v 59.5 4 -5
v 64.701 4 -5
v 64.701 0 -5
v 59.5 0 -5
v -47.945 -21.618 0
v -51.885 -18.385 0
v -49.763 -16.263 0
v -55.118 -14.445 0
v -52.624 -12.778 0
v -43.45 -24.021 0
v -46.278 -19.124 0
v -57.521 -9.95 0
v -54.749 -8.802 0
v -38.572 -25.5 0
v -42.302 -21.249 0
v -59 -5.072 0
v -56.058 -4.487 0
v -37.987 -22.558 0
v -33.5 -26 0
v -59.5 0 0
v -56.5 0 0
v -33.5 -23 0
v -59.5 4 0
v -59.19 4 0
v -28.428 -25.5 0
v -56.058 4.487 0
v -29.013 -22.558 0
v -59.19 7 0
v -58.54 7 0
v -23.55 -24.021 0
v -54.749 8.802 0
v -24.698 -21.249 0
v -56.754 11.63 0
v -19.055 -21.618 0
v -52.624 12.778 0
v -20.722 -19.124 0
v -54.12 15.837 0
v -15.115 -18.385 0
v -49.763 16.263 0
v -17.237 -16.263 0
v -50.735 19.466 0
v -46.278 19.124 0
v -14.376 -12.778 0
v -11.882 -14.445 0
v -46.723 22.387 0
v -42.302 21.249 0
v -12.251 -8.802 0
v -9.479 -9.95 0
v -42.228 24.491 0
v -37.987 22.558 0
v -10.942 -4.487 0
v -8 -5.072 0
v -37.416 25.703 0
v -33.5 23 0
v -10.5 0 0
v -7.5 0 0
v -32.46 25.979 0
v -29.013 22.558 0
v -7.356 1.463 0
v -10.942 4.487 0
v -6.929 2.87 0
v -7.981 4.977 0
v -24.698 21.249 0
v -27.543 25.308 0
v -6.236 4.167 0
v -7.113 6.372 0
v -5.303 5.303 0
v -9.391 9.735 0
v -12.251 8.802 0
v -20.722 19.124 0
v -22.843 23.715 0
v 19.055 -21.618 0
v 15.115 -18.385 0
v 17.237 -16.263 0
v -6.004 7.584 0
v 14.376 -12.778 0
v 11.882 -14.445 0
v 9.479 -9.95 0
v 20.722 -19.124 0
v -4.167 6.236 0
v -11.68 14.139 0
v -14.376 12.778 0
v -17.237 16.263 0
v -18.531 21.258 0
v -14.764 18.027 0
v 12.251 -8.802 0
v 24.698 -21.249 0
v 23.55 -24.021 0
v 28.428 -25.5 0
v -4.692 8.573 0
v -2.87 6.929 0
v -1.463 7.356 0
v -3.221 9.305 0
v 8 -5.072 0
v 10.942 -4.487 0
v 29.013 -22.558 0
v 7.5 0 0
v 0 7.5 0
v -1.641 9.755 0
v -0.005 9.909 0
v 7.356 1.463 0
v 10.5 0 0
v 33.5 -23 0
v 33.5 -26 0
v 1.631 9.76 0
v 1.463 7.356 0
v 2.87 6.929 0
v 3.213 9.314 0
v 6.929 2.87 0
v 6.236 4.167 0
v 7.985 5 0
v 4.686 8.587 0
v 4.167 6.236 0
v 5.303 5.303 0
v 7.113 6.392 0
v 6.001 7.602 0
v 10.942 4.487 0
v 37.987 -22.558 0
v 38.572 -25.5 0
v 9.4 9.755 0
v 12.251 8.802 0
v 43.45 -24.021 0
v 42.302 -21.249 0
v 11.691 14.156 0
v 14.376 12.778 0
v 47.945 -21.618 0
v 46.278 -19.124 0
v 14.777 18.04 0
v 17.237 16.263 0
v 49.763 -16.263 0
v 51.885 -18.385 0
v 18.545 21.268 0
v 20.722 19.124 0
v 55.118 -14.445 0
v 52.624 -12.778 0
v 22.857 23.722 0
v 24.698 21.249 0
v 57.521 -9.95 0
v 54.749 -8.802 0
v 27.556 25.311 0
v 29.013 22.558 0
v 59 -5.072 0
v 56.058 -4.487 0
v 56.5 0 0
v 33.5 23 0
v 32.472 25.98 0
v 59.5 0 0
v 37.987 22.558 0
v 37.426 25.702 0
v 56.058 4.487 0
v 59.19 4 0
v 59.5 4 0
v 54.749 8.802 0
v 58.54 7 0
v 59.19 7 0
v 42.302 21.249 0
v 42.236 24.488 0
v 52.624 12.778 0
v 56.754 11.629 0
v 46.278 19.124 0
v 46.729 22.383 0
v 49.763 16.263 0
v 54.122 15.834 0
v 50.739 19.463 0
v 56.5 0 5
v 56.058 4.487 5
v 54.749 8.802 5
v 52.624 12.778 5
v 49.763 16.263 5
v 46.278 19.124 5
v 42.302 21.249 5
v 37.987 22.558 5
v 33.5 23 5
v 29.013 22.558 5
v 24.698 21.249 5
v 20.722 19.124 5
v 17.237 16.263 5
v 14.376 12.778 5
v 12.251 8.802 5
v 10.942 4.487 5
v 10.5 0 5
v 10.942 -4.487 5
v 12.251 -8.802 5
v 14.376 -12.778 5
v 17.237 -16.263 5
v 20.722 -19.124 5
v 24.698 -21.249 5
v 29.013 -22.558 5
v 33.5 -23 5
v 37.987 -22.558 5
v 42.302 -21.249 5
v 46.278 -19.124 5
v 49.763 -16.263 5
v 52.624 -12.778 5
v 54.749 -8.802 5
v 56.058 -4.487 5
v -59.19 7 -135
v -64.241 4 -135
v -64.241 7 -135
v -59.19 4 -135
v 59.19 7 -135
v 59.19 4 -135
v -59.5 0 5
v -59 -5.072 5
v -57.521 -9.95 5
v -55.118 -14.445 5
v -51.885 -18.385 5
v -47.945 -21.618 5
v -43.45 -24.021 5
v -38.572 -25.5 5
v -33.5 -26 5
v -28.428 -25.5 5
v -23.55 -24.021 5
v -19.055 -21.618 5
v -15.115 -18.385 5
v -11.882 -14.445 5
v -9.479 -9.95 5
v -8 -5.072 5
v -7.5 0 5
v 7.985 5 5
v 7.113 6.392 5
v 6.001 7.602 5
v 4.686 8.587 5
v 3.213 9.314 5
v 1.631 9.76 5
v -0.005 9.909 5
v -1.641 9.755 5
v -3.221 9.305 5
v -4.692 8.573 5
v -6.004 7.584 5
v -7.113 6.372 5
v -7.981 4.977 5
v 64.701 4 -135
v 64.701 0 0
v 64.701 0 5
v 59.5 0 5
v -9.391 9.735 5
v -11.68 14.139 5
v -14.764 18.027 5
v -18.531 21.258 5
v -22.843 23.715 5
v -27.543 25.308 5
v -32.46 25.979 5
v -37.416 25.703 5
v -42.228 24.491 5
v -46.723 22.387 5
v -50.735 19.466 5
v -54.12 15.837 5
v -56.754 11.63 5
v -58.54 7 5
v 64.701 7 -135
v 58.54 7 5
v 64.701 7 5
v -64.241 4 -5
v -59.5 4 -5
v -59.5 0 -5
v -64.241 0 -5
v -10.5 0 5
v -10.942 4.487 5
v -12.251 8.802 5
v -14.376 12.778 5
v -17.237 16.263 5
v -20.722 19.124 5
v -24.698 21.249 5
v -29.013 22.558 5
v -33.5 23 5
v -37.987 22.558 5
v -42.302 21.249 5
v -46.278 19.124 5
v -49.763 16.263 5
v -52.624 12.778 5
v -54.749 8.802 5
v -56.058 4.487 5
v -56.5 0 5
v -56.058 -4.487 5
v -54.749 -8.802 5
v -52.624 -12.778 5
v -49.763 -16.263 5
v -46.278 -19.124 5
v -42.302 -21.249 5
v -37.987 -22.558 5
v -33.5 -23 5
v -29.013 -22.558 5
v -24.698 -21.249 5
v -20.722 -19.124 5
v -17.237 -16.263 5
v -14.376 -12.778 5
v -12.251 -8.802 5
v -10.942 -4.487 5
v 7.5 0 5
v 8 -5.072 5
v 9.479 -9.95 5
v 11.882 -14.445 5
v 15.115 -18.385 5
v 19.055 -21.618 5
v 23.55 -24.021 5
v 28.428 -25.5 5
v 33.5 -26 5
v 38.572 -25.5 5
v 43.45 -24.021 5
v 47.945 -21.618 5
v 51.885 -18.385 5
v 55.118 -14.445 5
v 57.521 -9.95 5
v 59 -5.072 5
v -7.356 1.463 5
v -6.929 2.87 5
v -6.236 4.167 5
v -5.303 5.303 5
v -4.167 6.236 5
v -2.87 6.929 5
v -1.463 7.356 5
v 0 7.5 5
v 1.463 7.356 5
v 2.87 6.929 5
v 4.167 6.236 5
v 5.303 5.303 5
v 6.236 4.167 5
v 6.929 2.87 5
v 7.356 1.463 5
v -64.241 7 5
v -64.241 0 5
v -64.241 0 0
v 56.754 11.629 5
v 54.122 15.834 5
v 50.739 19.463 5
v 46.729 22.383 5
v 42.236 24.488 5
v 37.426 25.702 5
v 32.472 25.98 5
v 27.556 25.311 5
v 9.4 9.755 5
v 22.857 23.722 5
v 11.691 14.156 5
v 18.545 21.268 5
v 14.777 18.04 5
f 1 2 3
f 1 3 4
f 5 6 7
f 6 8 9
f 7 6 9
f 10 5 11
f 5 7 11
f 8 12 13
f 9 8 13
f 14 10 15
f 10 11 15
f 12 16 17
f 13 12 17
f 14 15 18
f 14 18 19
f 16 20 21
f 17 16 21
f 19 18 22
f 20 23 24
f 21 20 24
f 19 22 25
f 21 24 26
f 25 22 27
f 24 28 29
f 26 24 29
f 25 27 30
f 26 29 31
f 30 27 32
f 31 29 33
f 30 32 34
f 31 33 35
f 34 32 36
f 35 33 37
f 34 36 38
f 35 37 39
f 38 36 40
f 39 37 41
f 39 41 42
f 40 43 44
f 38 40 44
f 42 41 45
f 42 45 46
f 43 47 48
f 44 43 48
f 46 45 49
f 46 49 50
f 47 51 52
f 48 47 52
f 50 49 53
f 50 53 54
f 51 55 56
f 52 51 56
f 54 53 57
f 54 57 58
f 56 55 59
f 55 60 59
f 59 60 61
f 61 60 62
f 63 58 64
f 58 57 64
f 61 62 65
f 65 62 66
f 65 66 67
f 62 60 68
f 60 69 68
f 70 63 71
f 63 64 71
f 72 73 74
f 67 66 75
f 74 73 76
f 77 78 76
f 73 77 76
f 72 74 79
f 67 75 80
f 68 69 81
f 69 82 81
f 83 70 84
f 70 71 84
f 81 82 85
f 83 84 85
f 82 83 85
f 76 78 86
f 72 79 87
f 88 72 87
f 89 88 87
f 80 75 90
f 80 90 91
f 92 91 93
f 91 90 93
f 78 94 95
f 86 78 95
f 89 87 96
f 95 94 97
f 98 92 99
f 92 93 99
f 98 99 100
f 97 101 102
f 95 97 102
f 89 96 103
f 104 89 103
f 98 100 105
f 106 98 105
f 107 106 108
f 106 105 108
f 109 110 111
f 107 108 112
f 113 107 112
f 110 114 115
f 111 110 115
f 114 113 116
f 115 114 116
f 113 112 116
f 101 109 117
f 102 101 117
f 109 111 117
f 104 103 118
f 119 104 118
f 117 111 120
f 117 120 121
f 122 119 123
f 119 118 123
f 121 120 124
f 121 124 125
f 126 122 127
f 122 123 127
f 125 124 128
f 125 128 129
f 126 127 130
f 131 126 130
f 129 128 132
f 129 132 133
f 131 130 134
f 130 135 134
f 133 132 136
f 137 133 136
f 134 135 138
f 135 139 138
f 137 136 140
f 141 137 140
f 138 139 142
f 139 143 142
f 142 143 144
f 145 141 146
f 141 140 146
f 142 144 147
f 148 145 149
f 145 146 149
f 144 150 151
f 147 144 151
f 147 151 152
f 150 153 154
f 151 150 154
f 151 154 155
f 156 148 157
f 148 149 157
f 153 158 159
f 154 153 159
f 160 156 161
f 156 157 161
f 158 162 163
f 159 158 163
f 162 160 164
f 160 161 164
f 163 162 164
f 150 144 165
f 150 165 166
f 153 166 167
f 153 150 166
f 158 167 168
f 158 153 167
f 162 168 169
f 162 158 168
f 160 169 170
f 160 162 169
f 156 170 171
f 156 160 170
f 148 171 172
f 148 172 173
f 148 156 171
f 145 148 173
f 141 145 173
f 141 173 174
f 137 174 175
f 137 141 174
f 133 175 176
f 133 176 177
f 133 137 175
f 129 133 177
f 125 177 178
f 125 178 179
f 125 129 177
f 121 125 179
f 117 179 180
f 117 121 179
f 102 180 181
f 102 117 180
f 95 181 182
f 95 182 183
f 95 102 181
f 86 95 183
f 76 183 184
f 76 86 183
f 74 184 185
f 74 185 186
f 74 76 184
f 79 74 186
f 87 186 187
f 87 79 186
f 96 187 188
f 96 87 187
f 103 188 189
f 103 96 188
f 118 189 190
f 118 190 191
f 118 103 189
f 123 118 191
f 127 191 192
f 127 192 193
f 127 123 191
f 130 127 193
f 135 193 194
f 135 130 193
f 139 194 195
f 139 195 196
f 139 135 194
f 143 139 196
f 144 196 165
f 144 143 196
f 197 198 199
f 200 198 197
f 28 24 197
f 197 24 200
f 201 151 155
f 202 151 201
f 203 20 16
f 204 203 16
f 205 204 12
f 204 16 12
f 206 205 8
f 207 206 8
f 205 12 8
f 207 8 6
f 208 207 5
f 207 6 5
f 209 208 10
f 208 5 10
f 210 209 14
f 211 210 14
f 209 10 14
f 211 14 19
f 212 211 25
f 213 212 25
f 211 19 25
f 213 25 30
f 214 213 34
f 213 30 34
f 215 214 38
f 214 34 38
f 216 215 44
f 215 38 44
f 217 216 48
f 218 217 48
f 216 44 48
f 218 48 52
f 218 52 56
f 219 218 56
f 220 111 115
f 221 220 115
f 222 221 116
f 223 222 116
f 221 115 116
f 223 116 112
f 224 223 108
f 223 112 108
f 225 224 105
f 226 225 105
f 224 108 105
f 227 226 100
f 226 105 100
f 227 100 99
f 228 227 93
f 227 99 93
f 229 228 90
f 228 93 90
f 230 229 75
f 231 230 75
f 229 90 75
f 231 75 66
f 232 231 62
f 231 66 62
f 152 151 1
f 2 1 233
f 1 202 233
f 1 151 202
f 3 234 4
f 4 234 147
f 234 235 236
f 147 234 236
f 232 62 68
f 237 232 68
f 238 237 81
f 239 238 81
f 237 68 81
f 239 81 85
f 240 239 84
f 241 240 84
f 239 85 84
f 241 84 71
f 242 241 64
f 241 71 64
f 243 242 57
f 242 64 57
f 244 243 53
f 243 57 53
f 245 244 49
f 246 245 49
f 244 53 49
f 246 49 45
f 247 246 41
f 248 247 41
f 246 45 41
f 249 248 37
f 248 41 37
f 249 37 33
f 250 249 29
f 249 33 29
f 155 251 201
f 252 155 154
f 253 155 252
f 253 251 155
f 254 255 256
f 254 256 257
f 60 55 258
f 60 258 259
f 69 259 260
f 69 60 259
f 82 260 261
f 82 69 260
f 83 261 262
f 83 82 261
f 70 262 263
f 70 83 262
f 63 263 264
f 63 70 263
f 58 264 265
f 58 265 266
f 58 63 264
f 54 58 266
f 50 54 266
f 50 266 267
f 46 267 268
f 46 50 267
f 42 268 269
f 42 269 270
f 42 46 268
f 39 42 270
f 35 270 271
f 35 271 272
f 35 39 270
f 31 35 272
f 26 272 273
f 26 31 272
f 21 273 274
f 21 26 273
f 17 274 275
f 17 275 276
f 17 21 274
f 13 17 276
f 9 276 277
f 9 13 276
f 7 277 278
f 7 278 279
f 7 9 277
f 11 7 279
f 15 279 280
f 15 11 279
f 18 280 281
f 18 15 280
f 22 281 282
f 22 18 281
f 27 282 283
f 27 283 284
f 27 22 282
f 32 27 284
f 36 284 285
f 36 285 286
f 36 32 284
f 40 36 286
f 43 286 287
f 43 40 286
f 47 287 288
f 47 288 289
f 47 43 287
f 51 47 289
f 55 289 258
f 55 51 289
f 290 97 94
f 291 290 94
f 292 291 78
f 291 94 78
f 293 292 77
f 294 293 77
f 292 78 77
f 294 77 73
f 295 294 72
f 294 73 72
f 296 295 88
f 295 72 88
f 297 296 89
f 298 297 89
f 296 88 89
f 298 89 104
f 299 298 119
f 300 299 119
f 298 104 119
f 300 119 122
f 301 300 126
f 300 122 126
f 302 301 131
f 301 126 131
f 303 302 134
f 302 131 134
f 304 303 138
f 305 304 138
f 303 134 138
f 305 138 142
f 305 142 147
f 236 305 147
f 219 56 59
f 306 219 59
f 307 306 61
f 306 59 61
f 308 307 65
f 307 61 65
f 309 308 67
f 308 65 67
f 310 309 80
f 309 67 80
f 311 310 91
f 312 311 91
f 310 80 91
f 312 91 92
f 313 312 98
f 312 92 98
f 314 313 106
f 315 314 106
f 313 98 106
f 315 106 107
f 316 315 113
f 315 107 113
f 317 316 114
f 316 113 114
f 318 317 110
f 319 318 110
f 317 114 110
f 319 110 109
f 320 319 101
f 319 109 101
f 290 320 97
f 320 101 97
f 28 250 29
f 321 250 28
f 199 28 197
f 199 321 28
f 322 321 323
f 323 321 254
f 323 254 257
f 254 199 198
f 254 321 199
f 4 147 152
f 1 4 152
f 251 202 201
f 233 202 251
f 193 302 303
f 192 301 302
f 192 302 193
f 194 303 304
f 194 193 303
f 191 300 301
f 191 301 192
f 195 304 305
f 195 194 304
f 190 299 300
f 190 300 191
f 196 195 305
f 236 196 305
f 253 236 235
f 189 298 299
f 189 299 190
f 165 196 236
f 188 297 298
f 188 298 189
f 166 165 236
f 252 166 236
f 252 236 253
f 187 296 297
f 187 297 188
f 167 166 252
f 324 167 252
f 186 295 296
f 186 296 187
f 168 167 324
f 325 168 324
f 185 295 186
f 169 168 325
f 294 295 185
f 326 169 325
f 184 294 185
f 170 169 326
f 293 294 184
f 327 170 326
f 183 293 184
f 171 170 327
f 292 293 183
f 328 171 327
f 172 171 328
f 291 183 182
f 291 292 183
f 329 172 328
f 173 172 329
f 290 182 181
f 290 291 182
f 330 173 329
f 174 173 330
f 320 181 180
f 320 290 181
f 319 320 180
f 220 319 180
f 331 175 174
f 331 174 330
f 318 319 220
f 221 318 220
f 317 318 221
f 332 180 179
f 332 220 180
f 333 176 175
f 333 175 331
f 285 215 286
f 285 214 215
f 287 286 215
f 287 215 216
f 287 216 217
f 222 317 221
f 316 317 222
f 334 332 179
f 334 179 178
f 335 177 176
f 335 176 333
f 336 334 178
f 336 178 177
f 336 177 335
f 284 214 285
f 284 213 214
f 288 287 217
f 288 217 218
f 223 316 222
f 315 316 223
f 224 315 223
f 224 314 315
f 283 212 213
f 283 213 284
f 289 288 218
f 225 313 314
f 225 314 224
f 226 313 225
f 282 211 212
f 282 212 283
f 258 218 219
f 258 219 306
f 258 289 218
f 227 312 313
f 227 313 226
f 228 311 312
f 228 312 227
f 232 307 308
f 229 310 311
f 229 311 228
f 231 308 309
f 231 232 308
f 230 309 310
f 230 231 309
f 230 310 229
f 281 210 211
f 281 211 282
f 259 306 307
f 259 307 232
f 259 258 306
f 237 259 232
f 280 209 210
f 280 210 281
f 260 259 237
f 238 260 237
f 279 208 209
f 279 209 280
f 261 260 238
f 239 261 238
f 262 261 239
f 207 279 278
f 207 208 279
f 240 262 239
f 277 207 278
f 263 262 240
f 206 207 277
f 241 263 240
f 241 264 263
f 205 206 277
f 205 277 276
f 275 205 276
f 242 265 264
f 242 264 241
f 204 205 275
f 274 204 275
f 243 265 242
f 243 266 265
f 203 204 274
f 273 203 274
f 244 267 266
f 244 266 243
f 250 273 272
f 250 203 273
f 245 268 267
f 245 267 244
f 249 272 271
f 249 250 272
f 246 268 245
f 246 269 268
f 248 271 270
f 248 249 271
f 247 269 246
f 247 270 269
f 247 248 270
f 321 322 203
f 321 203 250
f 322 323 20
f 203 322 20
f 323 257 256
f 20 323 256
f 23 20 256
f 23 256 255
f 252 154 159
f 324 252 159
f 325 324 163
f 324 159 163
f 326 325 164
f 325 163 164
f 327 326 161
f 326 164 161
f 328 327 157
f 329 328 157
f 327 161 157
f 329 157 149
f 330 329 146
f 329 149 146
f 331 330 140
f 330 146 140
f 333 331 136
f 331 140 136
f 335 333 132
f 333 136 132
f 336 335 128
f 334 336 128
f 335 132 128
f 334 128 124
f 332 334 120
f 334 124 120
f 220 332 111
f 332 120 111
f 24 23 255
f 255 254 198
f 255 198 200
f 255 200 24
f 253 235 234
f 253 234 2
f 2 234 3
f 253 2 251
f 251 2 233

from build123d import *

# Parameters (mm, degrees)
SKIZZE1_R                       = 23
AUFSATZ_LINEAR_AUSTRAGEN1_DEPTH = 5
SKIZZE2_W                       = 5.200502725
SKIZZE2_H                       = 4
SKIZZE2_W_2                     = 4.740793673
AUFSATZ_LINEAR_AUSTRAGEN2_DEPTH = 5
SKIZZE3_W                       = 5.510037568
SKIZZE3_H                       = 140
SKIZZE3_W_2                     = 5.050328516
AUFSATZ_LINEAR_AUSTRAGEN3_DEPTH = 3
SKIZZE4_W                       = 5
SKIZZE4_H                       = 3
AUFSATZ_LINEAR_AUSTRAGEN4_DEPTH = 3
SKIZZE5_W                       = 5
SKIZZE5_H                       = 3
AUFSATZ_LINEAR_AUSTRAGEN5_DEPTH = 3


with BuildPart() as part:
    # Skizze1 → Aufsatz-Linear austragen1 (new body)
    with BuildSketch(Plane.XY):
        with BuildLine():
            Line((64.700502725, 4), (59.190465157, 4))
            ThreePointArc((59.190465157, 4), (34.007664459, 25.995043312), (7.985298356, 5))
            ThreePointArc((7.985298356, 5), (-0.004875067, 9.908732253), (-7.980769231, 4.976832421))
            ThreePointArc((-7.980769231, 4.976832421), (-33.995863589, 25.995271095), (-59.190465157, 4))
            Line((-59.190465157, 4), (-64.240793673, 4))
            Line((-64.240793673, 4), (-64.240793673, 0))
            Line((-64.240793673, 0), (-59.5, 0))
            ThreePointArc((-59.5, 0), (-33.5, -26), (-7.5, 0))
            ThreePointArc((-7.5, 0), (0, 7.5), (7.5, 0))
            ThreePointArc((7.5, 0), (33.5, -26), (59.5, 0))
            Line((59.5, 0), (64.700502725, 0))
            Line((64.700502725, 0), (64.700502725, 4))
        make_face()
        with Locations((33.5, 0)):
            Circle(SKIZZE1_R, mode=Mode.SUBTRACT)
        with Locations((-33.5, 0)):
            Circle(SKIZZE1_R, mode=Mode.SUBTRACT)
    extrude(amount=AUFSATZ_LINEAR_AUSTRAGEN1_DEPTH)

    # Skizze2 → Aufsatz-Linear austragen2 (add)
    with BuildSketch(Plane(origin=(0, 0, 0), x_dir=(-1, 0, 0), z_dir=(0, 0, -1))):
        with Locations((-62.100251363, 2)):
            Rectangle(SKIZZE2_W, SKIZZE2_H)
        with Locations((61.870396837, 2)):
            Rectangle(SKIZZE2_W_2, SKIZZE2_H)
    extrude(amount=AUFSATZ_LINEAR_AUSTRAGEN2_DEPTH)

    # Skizze3 → Aufsatz-Linear austragen3 (add)
    with BuildSketch(Plane(origin=(0, 4, 0), x_dir=(1, 0, 0), z_dir=(0, 1, 0))):
        with Locations((61.945483941, 65)):
            Rectangle(SKIZZE3_W, SKIZZE3_H)
        with Locations((-61.715629415, 65)):
            Rectangle(SKIZZE3_W_2, SKIZZE3_H)
    extrude(amount=AUFSATZ_LINEAR_AUSTRAGEN3_DEPTH)

    # Skizze4 → Aufsatz-Linear austragen4 (add)
    with BuildSketch(Plane.ZY.offset(-59.190465157)):
        with Locations((2.5, 5.5)):
            Rectangle(SKIZZE4_W, SKIZZE4_H)
    extrude(amount=AUFSATZ_LINEAR_AUSTRAGEN4_DEPTH)

    # Skizze5 → Aufsatz-Linear austragen5 (add)
    with BuildSketch(Plane(origin=(-59.190465157, 0, 0), x_dir=(0, 0, -1), z_dir=(1, 0, 0))):
        with Locations((-2.5, 5.5)):
            Rectangle(SKIZZE5_W, SKIZZE5_H)
    extrude(amount=AUFSATZ_LINEAR_AUSTRAGEN5_DEPTH)


solid = part.part
